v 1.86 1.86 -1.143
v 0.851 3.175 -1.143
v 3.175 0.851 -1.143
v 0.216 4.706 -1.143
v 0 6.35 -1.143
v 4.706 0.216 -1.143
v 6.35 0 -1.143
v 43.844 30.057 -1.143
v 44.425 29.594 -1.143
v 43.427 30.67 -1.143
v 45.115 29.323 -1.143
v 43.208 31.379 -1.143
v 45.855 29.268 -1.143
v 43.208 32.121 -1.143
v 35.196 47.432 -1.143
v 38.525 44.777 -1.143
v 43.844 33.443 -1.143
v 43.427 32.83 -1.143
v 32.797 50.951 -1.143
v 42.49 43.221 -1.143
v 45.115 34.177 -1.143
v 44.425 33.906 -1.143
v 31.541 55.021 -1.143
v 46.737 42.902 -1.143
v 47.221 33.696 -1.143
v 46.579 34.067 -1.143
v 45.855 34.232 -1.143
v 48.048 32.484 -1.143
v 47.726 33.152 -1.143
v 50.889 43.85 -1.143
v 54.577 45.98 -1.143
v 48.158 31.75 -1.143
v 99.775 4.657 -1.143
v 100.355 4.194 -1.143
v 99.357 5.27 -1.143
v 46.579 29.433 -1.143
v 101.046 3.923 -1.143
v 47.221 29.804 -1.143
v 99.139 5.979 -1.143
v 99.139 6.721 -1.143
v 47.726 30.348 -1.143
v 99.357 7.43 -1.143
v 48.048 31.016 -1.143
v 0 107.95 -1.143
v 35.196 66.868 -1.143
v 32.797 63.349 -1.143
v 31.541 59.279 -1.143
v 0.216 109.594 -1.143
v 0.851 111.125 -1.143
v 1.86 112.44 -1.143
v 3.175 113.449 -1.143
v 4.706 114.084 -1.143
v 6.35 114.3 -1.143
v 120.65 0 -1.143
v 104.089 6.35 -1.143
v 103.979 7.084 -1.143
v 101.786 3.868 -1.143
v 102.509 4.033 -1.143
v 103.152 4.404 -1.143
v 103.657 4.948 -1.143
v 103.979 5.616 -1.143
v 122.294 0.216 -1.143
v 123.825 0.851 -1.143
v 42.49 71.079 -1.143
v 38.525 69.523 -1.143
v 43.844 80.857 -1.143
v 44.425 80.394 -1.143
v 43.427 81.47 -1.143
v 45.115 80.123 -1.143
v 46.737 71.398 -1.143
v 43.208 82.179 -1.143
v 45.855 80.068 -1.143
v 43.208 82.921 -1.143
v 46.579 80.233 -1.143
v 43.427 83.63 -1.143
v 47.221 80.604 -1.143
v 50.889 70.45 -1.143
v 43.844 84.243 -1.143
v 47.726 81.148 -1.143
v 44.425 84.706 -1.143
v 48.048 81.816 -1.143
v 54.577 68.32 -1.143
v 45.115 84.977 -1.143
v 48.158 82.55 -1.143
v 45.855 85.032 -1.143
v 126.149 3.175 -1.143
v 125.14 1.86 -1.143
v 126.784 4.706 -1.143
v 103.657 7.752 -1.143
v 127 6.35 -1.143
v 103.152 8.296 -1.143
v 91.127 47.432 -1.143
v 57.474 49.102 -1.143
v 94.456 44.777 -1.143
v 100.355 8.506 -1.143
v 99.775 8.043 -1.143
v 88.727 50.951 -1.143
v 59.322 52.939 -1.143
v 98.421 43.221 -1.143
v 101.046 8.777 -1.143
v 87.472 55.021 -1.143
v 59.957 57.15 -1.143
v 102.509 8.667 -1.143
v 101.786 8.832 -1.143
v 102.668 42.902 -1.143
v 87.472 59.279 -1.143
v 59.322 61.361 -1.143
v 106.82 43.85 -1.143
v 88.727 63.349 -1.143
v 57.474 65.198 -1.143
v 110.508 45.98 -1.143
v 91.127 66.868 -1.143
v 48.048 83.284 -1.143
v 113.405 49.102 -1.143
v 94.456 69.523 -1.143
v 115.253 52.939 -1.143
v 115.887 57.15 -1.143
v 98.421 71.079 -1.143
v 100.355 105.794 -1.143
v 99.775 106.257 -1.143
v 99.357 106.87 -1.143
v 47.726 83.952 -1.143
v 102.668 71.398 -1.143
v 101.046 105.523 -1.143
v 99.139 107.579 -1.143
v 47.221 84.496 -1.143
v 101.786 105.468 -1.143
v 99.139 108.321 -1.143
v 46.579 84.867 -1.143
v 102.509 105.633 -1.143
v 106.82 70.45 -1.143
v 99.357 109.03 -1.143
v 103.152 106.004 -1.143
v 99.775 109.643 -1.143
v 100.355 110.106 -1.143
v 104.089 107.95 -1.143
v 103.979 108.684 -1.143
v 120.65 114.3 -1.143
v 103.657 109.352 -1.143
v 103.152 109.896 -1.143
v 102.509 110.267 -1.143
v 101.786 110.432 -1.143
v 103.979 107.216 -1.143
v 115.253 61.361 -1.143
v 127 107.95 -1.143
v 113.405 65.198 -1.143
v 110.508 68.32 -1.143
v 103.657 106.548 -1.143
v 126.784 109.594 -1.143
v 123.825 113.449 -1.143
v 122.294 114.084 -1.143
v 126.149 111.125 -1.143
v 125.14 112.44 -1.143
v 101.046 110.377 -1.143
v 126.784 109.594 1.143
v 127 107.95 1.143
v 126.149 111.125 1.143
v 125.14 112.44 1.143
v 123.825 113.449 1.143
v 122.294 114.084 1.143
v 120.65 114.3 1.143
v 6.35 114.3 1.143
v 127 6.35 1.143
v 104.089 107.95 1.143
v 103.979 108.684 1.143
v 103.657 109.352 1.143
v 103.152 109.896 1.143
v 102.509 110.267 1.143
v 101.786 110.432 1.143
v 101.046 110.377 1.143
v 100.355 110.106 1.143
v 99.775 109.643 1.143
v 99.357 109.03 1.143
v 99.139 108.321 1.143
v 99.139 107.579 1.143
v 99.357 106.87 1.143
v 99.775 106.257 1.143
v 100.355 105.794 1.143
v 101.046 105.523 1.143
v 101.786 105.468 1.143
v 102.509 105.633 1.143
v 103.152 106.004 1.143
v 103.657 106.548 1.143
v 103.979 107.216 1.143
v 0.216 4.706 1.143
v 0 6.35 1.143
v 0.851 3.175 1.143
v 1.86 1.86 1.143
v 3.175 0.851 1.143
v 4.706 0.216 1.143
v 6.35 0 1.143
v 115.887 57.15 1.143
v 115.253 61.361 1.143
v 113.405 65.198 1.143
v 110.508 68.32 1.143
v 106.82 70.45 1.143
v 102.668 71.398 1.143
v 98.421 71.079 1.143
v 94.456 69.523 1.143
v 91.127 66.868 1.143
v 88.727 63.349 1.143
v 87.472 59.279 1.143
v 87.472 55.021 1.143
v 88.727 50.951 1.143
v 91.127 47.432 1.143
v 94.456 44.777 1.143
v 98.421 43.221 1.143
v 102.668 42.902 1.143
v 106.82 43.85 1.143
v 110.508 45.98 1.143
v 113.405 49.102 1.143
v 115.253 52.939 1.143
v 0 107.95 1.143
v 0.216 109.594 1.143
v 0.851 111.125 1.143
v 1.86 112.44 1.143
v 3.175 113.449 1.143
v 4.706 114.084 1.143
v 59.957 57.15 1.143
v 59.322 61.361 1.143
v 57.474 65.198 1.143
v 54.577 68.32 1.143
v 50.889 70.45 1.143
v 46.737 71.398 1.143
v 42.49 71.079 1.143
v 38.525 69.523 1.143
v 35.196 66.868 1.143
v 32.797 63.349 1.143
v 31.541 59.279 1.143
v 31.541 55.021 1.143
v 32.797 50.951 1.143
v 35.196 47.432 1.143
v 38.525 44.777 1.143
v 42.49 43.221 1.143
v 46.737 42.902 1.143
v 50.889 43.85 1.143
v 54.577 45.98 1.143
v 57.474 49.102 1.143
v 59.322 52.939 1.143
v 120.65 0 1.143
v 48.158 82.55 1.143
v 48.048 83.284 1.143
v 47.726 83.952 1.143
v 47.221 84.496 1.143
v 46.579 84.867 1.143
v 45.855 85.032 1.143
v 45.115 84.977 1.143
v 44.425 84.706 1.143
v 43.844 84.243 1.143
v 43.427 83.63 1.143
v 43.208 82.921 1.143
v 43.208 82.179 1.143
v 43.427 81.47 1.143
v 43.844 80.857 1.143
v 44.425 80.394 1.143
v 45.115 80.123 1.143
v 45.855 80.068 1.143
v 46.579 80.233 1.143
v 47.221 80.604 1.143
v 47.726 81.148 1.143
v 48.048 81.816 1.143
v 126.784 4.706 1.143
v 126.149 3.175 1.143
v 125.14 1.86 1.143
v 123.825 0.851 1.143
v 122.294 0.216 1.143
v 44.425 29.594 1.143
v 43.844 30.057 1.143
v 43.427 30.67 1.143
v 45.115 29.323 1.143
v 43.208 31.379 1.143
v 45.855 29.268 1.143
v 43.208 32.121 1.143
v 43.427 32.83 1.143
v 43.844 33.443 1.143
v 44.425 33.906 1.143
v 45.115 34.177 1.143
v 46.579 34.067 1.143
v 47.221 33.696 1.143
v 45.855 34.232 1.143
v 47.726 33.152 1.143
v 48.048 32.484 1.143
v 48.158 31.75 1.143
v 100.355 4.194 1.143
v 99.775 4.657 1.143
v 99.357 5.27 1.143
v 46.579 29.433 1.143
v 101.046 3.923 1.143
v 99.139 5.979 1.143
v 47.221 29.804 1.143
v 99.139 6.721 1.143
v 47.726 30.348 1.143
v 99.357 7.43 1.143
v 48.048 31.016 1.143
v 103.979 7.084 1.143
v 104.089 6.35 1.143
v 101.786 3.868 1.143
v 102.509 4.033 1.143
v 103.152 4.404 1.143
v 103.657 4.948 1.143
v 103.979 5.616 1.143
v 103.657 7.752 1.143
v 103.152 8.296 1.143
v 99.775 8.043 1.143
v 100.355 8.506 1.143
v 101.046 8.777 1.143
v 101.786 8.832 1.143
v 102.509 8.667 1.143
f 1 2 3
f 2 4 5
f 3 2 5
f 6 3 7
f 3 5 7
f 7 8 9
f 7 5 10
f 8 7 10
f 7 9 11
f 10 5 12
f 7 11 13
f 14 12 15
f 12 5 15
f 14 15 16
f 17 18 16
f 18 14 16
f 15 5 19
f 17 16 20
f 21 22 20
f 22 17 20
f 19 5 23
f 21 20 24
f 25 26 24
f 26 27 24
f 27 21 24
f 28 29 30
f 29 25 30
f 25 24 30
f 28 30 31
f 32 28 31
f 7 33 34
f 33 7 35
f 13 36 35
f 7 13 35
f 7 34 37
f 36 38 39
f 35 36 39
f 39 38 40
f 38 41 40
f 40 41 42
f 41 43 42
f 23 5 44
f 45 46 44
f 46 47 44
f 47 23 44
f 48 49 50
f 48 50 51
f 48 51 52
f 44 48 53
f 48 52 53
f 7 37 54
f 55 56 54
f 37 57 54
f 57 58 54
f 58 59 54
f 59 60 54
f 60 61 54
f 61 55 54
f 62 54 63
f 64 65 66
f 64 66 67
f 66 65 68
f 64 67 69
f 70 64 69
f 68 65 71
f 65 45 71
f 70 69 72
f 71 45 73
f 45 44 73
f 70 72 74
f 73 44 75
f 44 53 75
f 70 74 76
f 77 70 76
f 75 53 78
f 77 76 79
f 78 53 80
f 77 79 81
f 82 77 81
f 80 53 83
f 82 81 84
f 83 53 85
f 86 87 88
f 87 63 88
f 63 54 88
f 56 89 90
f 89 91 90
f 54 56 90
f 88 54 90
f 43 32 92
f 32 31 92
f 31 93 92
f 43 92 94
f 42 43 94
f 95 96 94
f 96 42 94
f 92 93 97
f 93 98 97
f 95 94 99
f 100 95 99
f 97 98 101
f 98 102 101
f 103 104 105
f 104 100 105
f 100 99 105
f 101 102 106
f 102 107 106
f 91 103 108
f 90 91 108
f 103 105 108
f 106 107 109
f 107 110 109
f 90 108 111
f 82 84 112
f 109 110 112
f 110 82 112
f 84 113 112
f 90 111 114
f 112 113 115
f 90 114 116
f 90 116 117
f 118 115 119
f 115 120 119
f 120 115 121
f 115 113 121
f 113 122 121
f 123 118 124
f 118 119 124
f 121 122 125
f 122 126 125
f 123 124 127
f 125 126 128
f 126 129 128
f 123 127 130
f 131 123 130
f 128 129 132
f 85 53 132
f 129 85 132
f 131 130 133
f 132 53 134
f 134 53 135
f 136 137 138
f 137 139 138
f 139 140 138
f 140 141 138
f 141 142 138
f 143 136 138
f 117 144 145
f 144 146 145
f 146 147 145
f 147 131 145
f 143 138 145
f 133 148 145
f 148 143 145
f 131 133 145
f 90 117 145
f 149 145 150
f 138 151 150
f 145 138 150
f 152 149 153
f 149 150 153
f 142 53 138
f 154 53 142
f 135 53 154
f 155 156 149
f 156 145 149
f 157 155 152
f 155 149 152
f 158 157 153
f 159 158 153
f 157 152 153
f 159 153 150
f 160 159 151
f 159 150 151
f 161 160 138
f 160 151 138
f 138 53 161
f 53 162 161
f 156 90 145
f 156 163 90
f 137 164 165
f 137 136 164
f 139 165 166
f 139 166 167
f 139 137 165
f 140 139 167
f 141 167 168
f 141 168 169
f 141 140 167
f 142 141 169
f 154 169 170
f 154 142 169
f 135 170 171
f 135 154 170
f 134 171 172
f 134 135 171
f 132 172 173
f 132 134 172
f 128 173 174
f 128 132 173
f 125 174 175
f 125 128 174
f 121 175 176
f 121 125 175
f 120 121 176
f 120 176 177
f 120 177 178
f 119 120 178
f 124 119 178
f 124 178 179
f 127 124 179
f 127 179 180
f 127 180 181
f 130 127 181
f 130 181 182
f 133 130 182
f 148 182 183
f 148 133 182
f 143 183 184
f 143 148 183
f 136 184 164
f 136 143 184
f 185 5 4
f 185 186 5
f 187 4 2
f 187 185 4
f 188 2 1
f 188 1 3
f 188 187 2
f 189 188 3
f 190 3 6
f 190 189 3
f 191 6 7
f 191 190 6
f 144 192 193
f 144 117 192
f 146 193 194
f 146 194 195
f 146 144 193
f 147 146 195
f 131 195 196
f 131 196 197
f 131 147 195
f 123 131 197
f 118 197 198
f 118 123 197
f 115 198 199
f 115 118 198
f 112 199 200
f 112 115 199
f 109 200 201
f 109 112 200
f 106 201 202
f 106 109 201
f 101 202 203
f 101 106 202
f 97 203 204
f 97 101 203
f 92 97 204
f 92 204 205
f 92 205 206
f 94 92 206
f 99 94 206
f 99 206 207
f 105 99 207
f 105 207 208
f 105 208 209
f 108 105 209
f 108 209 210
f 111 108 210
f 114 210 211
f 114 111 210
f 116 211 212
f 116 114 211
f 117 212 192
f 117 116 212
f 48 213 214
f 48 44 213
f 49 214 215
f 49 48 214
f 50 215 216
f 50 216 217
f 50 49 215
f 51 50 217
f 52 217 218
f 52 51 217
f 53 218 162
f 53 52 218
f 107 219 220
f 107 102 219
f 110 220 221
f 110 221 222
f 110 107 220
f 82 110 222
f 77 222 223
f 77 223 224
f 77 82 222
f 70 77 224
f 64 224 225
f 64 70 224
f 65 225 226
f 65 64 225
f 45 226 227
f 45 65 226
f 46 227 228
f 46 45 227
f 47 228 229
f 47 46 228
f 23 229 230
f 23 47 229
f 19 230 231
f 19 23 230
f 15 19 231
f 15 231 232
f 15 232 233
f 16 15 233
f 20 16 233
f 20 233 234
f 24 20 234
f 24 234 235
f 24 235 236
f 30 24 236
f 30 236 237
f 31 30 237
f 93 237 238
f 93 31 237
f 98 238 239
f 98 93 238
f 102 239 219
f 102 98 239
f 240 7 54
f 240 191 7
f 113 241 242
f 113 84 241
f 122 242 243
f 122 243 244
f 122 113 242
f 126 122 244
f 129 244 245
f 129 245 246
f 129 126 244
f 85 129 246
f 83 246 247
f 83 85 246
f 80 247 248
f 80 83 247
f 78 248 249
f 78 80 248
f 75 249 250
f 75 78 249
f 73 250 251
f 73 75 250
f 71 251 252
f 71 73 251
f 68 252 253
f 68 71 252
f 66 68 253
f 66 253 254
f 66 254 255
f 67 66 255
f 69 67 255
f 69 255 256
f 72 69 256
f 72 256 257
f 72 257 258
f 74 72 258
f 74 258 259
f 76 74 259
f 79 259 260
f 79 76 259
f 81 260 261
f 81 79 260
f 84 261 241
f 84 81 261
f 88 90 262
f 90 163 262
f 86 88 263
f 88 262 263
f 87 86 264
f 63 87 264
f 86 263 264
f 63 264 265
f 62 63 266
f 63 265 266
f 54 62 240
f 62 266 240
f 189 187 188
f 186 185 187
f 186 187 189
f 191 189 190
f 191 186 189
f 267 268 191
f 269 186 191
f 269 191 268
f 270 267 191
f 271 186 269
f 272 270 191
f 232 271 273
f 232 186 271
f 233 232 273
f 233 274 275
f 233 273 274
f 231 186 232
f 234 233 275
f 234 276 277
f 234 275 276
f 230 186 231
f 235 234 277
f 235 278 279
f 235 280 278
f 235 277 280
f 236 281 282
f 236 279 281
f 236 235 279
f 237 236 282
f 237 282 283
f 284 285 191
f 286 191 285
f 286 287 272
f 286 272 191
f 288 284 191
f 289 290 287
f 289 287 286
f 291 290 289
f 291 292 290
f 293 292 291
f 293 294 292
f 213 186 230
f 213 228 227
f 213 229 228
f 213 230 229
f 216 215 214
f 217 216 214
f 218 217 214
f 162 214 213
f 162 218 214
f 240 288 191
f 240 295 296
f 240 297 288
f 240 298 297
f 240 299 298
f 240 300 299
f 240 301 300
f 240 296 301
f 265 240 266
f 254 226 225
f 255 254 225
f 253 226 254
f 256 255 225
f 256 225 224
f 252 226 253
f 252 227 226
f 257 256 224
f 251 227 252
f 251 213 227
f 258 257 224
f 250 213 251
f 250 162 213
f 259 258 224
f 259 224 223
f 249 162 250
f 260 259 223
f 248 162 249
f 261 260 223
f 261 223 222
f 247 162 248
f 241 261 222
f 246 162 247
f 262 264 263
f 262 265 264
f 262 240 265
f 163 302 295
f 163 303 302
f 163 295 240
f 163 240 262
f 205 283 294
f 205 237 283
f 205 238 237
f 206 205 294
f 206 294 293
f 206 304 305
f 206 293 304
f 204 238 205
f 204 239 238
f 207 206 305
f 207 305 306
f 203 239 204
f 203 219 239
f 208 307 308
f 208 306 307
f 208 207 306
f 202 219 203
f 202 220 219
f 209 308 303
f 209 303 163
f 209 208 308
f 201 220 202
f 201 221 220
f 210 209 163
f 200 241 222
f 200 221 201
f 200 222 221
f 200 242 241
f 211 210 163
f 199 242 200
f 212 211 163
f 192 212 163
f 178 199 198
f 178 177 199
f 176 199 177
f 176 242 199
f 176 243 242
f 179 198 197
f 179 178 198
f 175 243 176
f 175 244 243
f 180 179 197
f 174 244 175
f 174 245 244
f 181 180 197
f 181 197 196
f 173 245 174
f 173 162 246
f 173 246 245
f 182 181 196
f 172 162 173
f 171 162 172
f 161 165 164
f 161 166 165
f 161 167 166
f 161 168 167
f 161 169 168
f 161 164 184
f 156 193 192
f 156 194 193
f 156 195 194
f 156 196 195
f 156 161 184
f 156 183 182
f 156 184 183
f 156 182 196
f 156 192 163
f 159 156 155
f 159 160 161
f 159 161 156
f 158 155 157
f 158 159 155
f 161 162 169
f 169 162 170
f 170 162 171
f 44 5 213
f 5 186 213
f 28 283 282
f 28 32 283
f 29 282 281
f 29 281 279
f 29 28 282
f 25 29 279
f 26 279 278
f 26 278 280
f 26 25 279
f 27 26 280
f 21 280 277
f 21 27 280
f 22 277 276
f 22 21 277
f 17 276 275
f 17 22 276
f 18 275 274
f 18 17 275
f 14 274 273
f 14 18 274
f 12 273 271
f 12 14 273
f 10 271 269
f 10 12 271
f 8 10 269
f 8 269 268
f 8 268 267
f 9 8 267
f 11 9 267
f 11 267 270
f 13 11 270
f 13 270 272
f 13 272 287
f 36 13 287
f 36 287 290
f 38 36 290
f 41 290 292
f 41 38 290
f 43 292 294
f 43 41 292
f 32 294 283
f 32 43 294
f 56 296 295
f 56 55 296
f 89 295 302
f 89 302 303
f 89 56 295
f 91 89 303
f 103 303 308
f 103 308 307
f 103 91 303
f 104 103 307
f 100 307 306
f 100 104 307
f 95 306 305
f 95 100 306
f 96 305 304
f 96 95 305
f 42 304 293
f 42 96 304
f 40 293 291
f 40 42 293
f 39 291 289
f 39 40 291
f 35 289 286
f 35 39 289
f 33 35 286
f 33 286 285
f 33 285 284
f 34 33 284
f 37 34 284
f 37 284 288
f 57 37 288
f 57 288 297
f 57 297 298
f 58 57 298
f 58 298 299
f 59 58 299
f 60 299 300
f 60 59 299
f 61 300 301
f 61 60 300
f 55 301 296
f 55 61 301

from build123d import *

# Parameters (mm, degrees)
SKETCH1_W           = 127
SKETCH1_H           = 114.3
SKETCH1_R           = 2.4892
SKETCH1_R_2         = 14.2875
BOSS_EXTRUDE1_DEPTH = 1.143
FILLET1_R           = 6.35


with BuildPart() as part:
    # Sketch1 → Boss-Extrude1 (new, symmetric)
    with BuildSketch(Plane.XY):
        with Locations((63.5, 57.15)):
            Rectangle(SKETCH1_W, SKETCH1_H)
        with Locations((45.6692, 82.55)):
            Circle(SKETCH1_R, mode=Mode.SUBTRACT)
        with Locations((45.6692, 57.15)):
            Circle(SKETCH1_R_2, mode=Mode.SUBTRACT)
        with Locations((45.6692, 31.75)):
            Circle(SKETCH1_R, mode=Mode.SUBTRACT)
        with Locations((101.6, 107.95)):
            Circle(SKETCH1_R, mode=Mode.SUBTRACT)
        with Locations((101.6, 57.15)):
            Circle(SKETCH1_R_2, mode=Mode.SUBTRACT)
        with Locations((101.6, 6.35)):
            Circle(SKETCH1_R, mode=Mode.SUBTRACT)
    extrude(amount=BOSS_EXTRUDE1_DEPTH, both=True)

    # Fillet1
    fillet1_edges = [part.edges().sort_by_distance(p)[0] for p in [
        (0, 114.3, 0),
        (127, 114.3, 0),
        (127, 0, 0),
        (0, 0, 0),
    ]]
    fillet(fillet1_edges, radius=FILLET1_R)


solid = part.part
